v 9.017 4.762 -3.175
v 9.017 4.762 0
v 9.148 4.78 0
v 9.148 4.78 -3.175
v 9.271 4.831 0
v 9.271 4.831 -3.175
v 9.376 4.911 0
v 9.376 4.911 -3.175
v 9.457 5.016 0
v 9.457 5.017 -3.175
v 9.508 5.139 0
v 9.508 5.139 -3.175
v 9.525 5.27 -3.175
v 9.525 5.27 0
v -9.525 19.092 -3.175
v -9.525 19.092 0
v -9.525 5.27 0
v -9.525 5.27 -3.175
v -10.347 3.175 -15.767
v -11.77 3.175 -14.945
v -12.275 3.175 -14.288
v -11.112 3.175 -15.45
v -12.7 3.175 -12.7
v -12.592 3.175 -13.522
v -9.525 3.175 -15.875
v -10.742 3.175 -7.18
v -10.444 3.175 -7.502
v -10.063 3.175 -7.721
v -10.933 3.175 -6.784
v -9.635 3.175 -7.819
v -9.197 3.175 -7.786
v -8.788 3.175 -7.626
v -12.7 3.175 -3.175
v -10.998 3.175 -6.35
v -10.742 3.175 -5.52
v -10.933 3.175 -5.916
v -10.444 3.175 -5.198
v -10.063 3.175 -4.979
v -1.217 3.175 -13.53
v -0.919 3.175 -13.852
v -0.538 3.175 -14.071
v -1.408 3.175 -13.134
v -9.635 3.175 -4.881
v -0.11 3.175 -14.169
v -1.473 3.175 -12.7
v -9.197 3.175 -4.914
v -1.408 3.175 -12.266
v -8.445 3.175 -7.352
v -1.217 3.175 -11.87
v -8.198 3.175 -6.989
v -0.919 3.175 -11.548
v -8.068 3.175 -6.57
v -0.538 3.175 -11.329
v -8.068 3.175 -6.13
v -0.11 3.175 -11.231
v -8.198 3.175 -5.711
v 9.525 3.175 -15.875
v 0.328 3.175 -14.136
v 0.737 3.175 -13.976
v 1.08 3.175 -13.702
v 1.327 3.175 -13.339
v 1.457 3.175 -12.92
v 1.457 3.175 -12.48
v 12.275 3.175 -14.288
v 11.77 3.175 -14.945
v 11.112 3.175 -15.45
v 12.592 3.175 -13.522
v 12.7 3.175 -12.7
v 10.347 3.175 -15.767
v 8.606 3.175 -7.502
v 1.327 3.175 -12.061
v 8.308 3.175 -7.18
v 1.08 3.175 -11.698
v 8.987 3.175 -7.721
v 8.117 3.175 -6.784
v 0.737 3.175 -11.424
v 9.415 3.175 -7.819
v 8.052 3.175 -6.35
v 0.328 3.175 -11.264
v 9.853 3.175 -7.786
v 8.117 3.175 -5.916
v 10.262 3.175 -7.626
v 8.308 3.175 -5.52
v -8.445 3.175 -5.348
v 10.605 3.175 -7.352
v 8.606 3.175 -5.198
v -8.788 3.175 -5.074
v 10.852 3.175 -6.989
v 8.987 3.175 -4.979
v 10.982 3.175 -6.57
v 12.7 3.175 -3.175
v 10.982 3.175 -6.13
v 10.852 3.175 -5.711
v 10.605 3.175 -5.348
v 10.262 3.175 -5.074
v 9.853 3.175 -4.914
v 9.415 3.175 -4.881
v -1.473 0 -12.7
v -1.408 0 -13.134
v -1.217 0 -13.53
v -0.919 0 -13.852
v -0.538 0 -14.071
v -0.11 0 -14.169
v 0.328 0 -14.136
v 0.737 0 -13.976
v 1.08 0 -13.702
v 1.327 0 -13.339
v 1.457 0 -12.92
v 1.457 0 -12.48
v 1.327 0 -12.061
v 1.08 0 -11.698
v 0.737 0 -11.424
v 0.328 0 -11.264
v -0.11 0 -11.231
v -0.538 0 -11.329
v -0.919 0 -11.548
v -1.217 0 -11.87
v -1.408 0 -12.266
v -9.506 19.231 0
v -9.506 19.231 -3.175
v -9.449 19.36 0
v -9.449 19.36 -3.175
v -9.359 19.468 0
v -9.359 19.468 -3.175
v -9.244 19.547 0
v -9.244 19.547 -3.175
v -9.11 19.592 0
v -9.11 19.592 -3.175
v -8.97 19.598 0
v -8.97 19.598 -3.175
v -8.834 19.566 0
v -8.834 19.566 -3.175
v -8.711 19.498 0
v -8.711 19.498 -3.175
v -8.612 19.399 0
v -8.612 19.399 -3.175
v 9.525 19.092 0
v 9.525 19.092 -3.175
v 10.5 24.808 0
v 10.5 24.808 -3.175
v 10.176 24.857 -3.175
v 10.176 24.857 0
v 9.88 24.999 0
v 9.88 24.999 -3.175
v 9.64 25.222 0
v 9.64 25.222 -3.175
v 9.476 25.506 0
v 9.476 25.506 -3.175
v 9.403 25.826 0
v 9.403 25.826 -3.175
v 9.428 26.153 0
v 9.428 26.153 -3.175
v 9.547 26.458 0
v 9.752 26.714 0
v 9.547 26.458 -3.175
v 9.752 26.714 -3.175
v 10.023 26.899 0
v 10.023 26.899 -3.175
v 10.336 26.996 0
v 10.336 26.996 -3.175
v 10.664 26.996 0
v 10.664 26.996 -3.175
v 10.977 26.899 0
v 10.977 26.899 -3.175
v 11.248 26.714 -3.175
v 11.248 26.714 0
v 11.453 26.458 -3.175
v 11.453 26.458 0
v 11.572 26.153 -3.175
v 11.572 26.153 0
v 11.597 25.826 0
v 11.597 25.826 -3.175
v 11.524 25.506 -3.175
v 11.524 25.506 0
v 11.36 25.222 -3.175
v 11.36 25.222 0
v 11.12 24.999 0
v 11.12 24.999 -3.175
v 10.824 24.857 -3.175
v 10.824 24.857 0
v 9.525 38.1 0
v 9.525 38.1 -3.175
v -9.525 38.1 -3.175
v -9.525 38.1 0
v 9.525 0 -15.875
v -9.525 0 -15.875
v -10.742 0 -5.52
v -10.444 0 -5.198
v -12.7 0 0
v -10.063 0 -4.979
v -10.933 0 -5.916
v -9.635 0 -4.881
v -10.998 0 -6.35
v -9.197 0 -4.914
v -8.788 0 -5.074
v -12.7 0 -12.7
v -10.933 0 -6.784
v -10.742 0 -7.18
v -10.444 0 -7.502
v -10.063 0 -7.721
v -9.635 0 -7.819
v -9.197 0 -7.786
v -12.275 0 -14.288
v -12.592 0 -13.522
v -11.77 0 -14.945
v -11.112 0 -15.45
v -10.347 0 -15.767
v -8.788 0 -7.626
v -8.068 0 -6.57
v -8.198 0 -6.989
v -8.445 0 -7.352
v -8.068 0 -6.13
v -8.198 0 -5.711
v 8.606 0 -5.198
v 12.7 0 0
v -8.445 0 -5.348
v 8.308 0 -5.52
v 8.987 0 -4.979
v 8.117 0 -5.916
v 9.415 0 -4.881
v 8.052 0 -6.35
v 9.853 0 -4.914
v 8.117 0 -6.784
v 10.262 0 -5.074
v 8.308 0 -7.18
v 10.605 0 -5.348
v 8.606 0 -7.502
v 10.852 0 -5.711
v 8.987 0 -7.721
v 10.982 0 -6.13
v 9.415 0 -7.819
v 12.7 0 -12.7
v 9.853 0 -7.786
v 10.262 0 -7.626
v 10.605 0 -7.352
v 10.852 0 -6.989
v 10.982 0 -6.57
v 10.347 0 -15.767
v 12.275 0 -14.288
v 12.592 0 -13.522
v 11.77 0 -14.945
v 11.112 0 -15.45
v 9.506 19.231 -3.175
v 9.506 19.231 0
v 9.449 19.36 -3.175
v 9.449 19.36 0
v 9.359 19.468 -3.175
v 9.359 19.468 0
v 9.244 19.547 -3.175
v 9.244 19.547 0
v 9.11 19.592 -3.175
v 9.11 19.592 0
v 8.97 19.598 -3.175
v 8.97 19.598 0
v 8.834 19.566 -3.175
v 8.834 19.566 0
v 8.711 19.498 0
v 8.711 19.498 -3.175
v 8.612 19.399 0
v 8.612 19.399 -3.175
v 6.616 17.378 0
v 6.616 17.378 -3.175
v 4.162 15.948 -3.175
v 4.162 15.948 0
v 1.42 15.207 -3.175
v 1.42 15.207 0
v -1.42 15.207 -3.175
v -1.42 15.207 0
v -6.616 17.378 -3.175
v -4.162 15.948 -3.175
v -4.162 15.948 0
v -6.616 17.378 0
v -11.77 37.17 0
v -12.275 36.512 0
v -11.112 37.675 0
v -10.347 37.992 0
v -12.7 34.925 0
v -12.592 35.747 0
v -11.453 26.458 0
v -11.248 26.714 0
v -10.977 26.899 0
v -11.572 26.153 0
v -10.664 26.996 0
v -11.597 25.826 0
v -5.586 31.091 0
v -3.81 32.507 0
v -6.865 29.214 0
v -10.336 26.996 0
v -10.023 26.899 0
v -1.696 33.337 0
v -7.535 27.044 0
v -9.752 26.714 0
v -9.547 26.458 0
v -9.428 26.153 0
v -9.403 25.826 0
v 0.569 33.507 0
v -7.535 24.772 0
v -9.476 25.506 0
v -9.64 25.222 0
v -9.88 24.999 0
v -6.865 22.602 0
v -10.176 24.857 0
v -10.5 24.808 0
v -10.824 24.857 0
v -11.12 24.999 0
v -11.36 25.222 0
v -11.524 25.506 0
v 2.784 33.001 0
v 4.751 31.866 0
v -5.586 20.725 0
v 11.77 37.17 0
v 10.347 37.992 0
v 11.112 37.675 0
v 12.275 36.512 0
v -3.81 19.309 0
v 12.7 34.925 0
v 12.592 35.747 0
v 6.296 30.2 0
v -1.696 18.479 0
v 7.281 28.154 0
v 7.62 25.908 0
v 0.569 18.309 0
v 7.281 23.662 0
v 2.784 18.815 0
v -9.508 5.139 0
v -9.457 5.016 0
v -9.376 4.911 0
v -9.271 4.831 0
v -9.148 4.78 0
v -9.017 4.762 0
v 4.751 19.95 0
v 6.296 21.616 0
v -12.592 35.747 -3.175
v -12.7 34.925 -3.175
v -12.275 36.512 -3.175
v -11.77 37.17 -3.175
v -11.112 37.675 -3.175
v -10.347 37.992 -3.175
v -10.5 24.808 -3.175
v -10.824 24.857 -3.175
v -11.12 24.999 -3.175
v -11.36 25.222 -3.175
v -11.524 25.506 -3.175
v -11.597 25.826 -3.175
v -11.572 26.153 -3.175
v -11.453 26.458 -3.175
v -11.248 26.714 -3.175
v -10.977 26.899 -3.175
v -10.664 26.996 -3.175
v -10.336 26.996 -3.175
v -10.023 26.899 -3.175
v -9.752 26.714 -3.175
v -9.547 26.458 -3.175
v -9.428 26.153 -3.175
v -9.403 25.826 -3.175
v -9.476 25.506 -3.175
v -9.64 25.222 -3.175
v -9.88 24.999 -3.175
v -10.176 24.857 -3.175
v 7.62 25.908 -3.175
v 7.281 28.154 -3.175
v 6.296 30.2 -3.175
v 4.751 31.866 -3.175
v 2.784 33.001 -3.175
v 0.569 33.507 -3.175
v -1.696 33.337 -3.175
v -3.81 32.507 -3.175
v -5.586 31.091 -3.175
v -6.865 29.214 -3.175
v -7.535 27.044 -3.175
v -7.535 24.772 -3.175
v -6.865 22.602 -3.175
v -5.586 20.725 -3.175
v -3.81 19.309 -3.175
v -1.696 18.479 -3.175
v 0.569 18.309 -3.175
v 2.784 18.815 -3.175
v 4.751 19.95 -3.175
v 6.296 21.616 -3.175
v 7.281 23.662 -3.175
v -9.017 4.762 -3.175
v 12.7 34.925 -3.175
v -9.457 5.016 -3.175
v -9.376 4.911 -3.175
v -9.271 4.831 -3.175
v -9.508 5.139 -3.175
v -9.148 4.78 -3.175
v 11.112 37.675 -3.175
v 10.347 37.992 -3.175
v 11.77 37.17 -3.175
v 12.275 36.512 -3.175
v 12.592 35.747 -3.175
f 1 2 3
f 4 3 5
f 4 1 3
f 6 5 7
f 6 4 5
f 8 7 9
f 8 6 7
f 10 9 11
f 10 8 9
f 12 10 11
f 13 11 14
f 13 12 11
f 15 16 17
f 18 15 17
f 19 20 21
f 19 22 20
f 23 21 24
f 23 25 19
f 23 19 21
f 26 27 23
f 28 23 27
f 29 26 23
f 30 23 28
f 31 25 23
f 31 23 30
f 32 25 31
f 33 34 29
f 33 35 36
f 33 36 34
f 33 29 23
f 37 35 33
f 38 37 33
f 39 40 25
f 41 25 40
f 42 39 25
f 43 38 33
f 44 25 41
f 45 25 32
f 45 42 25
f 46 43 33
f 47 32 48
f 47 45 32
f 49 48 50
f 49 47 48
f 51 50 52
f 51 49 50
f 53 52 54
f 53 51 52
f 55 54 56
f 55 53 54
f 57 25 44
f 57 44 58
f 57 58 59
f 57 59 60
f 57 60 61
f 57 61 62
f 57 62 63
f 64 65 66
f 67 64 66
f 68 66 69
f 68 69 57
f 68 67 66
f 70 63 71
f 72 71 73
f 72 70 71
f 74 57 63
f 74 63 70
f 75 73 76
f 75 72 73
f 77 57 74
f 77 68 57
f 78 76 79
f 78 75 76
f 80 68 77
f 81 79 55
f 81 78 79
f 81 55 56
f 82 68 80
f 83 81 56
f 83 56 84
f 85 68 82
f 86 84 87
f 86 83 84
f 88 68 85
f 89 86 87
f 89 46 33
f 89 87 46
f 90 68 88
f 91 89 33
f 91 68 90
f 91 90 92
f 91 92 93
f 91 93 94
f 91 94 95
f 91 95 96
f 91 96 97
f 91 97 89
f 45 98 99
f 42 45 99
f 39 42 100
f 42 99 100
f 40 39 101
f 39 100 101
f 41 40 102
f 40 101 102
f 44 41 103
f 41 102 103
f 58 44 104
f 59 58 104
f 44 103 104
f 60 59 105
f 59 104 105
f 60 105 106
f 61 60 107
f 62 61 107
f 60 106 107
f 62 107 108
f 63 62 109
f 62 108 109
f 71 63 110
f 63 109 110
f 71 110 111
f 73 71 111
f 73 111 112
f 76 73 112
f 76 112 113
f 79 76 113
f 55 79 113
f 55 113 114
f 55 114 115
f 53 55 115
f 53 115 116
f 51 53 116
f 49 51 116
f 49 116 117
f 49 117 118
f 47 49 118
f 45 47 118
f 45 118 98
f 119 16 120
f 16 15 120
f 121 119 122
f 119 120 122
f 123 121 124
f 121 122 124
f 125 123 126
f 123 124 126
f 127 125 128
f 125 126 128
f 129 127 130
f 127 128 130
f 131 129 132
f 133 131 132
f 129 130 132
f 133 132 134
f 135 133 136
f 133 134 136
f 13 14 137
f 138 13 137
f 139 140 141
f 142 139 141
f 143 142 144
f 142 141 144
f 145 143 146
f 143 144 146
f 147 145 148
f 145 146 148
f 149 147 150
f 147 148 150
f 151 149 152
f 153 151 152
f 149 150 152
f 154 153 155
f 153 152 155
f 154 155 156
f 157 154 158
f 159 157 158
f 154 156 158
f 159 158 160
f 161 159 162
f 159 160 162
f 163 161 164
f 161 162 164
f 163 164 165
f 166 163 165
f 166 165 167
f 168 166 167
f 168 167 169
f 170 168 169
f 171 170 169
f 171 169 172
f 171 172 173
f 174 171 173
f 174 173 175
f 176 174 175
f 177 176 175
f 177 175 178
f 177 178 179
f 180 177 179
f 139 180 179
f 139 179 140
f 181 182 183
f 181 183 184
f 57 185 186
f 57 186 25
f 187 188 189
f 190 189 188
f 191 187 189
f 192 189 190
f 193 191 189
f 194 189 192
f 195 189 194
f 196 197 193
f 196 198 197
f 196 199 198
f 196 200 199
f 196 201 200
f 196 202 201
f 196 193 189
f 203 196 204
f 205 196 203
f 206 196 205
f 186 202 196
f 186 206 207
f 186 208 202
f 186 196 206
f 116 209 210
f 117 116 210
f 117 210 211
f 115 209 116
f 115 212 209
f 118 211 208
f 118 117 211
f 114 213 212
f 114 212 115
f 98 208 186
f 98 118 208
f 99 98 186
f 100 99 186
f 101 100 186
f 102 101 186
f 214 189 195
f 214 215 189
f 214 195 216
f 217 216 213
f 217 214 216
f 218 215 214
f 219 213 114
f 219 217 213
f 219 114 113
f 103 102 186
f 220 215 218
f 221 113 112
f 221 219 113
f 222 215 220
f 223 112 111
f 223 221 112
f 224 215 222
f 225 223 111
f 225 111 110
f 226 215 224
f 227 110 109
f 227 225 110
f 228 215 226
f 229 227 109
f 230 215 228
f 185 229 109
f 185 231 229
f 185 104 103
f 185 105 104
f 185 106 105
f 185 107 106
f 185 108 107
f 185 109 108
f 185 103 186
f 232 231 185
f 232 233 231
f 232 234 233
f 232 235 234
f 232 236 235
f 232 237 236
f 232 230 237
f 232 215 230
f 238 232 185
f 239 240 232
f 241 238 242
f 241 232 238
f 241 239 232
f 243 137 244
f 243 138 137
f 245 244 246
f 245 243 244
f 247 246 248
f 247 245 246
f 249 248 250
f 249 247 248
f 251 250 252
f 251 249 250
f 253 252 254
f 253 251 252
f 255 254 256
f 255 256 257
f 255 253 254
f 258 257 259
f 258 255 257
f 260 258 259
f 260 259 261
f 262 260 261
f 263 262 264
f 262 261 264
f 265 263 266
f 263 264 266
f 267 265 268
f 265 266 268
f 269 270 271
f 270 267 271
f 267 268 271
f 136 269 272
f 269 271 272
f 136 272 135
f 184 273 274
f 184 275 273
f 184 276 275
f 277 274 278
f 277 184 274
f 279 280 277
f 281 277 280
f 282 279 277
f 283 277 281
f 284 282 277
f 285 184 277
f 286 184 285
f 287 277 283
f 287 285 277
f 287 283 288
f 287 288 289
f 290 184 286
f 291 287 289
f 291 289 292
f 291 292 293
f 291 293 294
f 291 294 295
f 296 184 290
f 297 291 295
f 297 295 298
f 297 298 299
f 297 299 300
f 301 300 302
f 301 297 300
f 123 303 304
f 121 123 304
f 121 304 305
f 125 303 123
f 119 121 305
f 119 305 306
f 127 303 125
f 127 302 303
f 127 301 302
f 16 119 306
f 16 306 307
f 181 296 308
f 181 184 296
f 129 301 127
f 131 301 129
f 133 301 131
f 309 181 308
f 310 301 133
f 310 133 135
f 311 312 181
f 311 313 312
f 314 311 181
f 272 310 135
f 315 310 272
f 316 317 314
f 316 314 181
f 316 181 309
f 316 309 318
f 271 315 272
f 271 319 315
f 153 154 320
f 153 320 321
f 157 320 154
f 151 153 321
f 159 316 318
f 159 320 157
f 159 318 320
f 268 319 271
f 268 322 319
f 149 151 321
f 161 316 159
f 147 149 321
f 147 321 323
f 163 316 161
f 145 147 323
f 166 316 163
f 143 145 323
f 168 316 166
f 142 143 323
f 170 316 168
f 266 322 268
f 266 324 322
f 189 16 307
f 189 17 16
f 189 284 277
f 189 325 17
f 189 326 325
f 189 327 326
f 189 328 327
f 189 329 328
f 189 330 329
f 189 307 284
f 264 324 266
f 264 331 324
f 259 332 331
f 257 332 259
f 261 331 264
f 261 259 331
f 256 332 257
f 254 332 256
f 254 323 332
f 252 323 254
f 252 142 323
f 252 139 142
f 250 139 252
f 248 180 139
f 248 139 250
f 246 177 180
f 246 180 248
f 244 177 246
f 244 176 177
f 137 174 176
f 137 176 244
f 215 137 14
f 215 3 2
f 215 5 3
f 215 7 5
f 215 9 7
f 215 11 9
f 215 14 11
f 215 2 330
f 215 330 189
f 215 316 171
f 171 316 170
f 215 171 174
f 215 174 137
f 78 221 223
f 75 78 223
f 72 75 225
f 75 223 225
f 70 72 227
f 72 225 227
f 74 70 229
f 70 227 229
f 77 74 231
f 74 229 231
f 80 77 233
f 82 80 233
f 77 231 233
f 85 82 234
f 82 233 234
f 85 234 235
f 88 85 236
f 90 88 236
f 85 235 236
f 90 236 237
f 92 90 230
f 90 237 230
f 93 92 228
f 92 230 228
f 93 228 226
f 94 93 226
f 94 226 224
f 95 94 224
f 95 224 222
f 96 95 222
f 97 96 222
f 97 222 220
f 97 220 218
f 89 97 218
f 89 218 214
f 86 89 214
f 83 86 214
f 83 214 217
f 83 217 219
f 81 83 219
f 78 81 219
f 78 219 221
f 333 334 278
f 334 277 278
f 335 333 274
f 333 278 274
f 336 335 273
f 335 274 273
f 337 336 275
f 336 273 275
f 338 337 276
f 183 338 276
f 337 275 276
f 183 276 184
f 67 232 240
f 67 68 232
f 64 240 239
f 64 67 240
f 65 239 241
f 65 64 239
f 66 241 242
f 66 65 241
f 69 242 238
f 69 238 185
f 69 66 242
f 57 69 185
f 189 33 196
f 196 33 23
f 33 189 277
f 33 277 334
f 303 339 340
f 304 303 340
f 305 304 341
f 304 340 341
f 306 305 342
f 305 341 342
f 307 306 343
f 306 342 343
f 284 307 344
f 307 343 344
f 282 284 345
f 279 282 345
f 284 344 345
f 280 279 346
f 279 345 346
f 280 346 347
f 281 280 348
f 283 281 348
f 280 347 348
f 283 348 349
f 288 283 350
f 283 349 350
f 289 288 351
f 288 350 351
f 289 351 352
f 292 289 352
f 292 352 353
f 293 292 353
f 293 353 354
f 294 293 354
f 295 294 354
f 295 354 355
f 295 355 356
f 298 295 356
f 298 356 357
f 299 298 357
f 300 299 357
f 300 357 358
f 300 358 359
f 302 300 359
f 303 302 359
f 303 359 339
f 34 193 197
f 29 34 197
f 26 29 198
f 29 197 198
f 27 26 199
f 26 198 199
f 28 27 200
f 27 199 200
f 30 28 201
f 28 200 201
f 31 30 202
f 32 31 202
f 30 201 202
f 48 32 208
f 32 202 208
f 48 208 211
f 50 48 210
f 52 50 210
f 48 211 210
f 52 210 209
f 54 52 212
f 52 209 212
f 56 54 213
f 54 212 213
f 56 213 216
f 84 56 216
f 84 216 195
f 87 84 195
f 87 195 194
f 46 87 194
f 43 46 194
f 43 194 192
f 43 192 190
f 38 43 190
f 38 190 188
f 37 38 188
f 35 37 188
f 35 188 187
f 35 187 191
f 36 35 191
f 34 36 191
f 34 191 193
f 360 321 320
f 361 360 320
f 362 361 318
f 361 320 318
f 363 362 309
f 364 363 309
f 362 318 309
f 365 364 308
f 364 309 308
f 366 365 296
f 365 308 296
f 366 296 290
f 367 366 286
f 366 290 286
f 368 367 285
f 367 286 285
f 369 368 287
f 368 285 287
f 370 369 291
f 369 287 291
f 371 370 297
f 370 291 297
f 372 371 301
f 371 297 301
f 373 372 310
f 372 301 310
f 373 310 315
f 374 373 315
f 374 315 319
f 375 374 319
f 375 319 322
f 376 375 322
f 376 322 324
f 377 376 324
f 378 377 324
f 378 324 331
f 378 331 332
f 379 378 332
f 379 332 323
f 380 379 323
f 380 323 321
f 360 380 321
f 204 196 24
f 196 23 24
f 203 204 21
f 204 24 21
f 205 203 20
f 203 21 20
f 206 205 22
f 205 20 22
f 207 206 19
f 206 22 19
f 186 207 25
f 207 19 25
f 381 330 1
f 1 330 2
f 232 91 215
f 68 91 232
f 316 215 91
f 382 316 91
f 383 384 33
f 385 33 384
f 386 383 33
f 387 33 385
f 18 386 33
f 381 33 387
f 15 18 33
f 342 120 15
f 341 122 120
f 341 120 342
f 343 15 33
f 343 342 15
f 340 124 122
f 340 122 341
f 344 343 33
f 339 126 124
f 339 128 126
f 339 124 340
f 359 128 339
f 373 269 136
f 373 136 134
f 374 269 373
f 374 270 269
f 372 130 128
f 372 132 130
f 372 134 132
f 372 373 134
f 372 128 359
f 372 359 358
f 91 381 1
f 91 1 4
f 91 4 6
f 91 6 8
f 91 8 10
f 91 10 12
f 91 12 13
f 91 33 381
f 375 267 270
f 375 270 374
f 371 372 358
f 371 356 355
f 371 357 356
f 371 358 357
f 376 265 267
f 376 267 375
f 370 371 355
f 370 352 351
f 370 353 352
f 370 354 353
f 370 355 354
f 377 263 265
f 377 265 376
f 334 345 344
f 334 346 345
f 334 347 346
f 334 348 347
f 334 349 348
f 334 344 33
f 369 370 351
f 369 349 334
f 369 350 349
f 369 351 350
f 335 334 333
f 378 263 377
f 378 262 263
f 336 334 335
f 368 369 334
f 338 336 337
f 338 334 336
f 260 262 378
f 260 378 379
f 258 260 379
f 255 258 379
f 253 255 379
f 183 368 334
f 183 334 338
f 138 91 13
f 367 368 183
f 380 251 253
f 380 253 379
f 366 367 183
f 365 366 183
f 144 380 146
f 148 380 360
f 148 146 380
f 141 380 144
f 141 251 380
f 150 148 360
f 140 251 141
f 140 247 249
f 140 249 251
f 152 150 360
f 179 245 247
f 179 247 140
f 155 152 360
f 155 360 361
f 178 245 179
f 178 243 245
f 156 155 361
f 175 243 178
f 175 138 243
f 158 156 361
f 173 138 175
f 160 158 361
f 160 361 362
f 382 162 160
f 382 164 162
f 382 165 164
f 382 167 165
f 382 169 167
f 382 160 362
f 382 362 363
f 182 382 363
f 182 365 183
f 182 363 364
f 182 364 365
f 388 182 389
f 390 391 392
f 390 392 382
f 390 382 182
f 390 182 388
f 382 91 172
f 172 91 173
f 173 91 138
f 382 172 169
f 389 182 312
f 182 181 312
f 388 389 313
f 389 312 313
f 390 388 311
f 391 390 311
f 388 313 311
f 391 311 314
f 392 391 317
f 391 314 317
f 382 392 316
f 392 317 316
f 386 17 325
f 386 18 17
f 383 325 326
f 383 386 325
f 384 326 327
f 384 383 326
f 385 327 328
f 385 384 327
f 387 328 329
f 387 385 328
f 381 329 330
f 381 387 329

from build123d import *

# Parameters (mm, degrees)
BOSS_EXTRUDE1_DEPTH   = 12.7
SKETCH2_R             = 7.62
CUT_EXTRUDE1_DEPTH    = 16.875
FILLET1_R             = 3.175
F_4_CLEARANCE_HOLE1_D = 2.9464
M2_CLEARANCE_HOLE1_D  = 2.2
CUT_EXTRUDE2_DEPTH    = 16.875
FILLET2_R             = 0.508


with BuildPart() as part:
    # Sketch1 → Boss-Extrude1 (new body, symmetric)
    with BuildSketch(Plane(origin=(0, 0, 0), x_dir=(0, 0, -1), z_dir=(1, 0, 0))):
        Polygon((0, 38.1), (0, 0), (15.875, 0), (15.875, 3.175), (3.175, 3.175), (3.175, 38.1), align=None)
    extrude(amount=BOSS_EXTRUDE1_DEPTH, both=True)

    # Sketch2 → Cut-Extrude1 (cut, through all)
    with BuildSketch(Plane.XY):
        with Locations((0, 25.908)):
            Circle(SKETCH2_R)
    extrude(amount=-CUT_EXTRUDE1_DEPTH, mode=Mode.SUBTRACT)

    # Fillet1
    fillet1_edges = [part.edges().sort_by_distance(p)[0] for p in [
        (12.7, 1.5875, -15.875),
        (12.7, 38.1, -1.5875),
        (-12.7, 1.5875, -15.875),
        (-12.7, 38.1, -1.5875),
    ]]
    fillet(fillet1_edges, radius=FILLET1_R)

    # #4 Clearance Hole1 (through all)
    with Locations(Plane(origin=(0, 3.175, 0), x_dir=(1, 0, 0), z_dir=(0, 1, 0))):
        with Locations((-9.525, 6.35), (0, 12.7), (9.525, 6.35)):
            Hole(F_4_CLEARANCE_HOLE1_D / 2)

    # M2 Clearance Hole1 (through all)
    with Locations(Plane(origin=(32.851265871, 6.645872946, 0), x_dir=(0, 1, 0), z_dir=(0, 0, 1))):
        with Locations((19.262127054, 22.351265871), (19.262127054, 43.351265871)):
            Hole(M2_CLEARANCE_HOLE1_D / 2)

    # Sketch7 → Cut-Extrude2 (cut, through all)
    with BuildSketch(Plane.XY):
        with BuildLine():
            Line((-9.525, 20.828), (-9.525, 4.7625))
            Line((-9.525, 4.7625), (9.525, 4.7625))
            Line((9.525, 4.7625), (9.525, 20.828))
            ThreePointArc((9.525, 20.828), (0, 15.113), (-9.525, 20.828))
        make_face()
    extrude(amount=-CUT_EXTRUDE2_DEPTH, mode=Mode.SUBTRACT)

    # Fillet2
    fillet2_edges = [part.edges().sort_by_distance(p)[0] for p in [
        (-9.525, 20.828, -1.5875),
        (9.525, 20.828, -1.5875),
        (9.525, 4.7625, -1.5875),
        (-9.525, 4.7625, -1.5875),
    ]]
    fillet(fillet2_edges, radius=FILLET2_R)


solid = part.part
